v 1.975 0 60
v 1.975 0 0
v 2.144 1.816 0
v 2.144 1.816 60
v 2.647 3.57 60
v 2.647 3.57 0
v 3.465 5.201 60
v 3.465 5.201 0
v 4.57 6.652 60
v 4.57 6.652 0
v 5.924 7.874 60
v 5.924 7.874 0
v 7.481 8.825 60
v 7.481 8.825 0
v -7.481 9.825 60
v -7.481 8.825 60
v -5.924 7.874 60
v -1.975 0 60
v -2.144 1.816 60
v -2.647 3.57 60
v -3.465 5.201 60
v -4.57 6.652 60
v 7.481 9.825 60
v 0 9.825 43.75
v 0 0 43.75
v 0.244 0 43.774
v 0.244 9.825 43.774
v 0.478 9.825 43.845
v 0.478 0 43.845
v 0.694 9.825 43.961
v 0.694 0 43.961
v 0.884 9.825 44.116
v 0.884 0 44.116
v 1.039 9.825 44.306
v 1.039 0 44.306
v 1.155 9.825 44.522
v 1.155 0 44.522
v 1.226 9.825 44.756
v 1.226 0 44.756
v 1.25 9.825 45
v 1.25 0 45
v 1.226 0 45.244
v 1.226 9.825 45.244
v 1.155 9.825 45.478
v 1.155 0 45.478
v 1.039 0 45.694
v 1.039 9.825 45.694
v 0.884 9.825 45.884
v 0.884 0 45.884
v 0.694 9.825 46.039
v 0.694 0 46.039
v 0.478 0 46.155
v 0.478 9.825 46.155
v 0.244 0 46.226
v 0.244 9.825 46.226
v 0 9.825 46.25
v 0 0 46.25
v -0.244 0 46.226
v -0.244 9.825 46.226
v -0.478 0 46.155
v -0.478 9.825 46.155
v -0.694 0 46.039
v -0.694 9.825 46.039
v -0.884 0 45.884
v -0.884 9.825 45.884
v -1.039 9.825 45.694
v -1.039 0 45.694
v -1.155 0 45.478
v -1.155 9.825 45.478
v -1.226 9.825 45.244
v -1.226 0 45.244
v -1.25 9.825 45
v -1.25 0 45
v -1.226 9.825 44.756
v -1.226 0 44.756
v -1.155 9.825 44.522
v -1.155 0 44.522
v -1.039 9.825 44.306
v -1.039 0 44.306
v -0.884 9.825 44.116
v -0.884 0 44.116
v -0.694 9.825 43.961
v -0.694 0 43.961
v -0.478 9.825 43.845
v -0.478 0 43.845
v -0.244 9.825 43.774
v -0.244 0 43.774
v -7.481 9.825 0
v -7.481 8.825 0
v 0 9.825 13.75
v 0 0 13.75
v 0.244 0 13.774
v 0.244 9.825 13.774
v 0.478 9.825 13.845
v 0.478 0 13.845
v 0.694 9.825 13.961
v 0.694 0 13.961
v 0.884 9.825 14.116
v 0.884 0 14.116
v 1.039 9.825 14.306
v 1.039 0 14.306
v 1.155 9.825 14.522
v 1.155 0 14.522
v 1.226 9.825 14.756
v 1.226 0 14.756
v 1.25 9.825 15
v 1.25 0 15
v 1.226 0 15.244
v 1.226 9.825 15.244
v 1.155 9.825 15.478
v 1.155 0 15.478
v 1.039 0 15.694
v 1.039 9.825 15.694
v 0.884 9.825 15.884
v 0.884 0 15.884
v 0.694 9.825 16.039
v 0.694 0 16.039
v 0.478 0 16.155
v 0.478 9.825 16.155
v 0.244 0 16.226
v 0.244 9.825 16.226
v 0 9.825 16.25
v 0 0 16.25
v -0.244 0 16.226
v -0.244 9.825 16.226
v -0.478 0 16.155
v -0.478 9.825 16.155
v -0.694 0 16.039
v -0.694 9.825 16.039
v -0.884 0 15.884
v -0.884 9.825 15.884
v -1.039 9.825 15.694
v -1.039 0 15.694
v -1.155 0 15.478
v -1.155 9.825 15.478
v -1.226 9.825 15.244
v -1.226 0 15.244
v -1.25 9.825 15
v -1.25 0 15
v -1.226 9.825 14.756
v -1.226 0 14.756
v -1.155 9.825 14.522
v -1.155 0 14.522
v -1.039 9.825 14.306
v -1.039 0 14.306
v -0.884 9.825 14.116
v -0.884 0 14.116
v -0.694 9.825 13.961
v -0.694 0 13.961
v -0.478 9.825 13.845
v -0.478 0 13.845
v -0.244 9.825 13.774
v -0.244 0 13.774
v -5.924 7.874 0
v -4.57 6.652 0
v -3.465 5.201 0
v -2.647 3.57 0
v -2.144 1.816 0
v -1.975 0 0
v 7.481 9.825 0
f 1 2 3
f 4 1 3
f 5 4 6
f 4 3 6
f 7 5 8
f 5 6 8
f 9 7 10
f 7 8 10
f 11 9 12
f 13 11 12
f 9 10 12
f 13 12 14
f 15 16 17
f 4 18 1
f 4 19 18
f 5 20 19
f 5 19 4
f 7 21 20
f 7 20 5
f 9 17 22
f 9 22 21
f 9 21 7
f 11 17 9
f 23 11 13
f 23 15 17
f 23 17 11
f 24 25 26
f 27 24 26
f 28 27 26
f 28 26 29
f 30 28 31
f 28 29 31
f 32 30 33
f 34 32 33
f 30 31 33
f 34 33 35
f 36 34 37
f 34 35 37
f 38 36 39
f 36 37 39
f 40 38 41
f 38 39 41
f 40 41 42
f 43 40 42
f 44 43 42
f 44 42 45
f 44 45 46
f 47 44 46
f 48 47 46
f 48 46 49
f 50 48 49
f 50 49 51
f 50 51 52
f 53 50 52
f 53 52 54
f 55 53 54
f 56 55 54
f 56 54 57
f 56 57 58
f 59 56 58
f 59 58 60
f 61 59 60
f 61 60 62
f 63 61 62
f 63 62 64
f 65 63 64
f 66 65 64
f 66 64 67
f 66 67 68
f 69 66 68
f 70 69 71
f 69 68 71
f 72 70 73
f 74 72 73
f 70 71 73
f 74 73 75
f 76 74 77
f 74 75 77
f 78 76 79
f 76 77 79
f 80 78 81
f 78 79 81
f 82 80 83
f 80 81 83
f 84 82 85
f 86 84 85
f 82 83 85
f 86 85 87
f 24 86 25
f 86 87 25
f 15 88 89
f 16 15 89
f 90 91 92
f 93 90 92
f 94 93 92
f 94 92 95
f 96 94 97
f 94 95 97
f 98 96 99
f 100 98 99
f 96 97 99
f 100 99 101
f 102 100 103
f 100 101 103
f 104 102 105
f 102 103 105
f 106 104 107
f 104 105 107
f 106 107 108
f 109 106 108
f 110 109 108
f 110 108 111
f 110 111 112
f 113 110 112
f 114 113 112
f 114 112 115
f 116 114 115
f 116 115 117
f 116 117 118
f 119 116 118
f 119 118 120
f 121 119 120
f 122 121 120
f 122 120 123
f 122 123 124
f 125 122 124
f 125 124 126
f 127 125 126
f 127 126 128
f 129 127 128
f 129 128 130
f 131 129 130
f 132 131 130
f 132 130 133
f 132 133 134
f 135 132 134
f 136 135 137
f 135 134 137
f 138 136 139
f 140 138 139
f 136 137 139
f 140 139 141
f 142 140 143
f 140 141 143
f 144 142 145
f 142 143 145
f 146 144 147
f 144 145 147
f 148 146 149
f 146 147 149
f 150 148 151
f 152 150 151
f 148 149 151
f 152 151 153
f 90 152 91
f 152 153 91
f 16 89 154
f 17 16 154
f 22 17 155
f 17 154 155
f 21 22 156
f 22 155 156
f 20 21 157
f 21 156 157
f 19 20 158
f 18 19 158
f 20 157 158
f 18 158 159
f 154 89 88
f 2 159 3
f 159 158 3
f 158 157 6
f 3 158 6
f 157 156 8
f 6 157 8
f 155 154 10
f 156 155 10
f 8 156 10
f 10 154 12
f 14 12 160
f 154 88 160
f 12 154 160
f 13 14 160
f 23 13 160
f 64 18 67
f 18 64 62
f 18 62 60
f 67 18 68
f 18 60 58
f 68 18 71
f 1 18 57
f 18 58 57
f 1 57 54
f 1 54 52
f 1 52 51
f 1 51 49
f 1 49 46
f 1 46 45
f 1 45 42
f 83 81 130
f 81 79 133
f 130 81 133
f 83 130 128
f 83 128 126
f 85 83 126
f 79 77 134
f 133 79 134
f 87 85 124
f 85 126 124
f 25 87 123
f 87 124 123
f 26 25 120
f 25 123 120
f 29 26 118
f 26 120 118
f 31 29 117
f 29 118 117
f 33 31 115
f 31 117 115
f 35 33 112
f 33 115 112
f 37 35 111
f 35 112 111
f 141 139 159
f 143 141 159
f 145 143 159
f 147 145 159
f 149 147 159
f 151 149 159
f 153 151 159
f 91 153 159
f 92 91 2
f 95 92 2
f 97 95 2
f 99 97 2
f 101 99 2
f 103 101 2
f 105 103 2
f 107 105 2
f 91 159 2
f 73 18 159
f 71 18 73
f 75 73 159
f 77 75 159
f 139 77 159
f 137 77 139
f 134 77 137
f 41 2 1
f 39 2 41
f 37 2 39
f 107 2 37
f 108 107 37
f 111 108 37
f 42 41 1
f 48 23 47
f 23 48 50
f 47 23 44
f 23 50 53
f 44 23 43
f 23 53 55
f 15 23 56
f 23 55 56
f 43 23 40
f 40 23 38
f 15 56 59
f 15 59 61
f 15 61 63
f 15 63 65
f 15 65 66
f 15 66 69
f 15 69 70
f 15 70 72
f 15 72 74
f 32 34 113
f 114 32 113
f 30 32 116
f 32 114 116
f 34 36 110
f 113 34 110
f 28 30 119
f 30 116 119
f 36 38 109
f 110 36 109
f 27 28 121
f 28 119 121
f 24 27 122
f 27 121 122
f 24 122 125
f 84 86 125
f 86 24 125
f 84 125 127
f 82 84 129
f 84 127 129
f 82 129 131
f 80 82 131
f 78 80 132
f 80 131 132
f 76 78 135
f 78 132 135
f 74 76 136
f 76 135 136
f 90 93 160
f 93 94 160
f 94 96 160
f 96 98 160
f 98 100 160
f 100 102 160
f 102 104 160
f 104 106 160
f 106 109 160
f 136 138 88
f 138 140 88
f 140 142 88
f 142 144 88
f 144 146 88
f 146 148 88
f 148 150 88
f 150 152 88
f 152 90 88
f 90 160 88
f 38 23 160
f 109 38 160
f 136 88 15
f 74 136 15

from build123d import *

# Parameters (mm, degrees)
BOSS_EXTRUDE1_DEPTH   = 60
F_2_5MM_DOWEL_HOLE1_D = 2.5


with BuildPart() as part:
    # Sketch1 → Boss-Extrude1 (new body)
    with BuildSketch(Plane.XY):
        with BuildLine():
            Line((-1.975, 0), (1.975, 0))
            ThreePointArc((1.975, 0), (3.464517951, 5.200996445), (7.481435424, 8.825))
            Line((7.481435424, 8.825), (7.481435424, 9.825))
            Line((7.481435424, 9.825), (-7.481435424, 9.825))
            Line((-7.481435424, 9.825), (-7.481435424, 8.825))
            ThreePointArc((-7.481435424, 8.825), (-3.464517951, 5.200996445), (-1.975, 0))
        make_face()
    extrude(amount=BOSS_EXTRUDE1_DEPTH)

    # Ø2.5mm Dowel Hole1 (through all)
    with Locations(Plane(origin=(0, 9.825, 45), x_dir=(0, 0, 1), z_dir=(0, 1, 0))):
        with Locations((0, 0), (-30, 0)):
            Hole(F_2_5MM_DOWEL_HOLE1_D / 2)


solid = part.part
